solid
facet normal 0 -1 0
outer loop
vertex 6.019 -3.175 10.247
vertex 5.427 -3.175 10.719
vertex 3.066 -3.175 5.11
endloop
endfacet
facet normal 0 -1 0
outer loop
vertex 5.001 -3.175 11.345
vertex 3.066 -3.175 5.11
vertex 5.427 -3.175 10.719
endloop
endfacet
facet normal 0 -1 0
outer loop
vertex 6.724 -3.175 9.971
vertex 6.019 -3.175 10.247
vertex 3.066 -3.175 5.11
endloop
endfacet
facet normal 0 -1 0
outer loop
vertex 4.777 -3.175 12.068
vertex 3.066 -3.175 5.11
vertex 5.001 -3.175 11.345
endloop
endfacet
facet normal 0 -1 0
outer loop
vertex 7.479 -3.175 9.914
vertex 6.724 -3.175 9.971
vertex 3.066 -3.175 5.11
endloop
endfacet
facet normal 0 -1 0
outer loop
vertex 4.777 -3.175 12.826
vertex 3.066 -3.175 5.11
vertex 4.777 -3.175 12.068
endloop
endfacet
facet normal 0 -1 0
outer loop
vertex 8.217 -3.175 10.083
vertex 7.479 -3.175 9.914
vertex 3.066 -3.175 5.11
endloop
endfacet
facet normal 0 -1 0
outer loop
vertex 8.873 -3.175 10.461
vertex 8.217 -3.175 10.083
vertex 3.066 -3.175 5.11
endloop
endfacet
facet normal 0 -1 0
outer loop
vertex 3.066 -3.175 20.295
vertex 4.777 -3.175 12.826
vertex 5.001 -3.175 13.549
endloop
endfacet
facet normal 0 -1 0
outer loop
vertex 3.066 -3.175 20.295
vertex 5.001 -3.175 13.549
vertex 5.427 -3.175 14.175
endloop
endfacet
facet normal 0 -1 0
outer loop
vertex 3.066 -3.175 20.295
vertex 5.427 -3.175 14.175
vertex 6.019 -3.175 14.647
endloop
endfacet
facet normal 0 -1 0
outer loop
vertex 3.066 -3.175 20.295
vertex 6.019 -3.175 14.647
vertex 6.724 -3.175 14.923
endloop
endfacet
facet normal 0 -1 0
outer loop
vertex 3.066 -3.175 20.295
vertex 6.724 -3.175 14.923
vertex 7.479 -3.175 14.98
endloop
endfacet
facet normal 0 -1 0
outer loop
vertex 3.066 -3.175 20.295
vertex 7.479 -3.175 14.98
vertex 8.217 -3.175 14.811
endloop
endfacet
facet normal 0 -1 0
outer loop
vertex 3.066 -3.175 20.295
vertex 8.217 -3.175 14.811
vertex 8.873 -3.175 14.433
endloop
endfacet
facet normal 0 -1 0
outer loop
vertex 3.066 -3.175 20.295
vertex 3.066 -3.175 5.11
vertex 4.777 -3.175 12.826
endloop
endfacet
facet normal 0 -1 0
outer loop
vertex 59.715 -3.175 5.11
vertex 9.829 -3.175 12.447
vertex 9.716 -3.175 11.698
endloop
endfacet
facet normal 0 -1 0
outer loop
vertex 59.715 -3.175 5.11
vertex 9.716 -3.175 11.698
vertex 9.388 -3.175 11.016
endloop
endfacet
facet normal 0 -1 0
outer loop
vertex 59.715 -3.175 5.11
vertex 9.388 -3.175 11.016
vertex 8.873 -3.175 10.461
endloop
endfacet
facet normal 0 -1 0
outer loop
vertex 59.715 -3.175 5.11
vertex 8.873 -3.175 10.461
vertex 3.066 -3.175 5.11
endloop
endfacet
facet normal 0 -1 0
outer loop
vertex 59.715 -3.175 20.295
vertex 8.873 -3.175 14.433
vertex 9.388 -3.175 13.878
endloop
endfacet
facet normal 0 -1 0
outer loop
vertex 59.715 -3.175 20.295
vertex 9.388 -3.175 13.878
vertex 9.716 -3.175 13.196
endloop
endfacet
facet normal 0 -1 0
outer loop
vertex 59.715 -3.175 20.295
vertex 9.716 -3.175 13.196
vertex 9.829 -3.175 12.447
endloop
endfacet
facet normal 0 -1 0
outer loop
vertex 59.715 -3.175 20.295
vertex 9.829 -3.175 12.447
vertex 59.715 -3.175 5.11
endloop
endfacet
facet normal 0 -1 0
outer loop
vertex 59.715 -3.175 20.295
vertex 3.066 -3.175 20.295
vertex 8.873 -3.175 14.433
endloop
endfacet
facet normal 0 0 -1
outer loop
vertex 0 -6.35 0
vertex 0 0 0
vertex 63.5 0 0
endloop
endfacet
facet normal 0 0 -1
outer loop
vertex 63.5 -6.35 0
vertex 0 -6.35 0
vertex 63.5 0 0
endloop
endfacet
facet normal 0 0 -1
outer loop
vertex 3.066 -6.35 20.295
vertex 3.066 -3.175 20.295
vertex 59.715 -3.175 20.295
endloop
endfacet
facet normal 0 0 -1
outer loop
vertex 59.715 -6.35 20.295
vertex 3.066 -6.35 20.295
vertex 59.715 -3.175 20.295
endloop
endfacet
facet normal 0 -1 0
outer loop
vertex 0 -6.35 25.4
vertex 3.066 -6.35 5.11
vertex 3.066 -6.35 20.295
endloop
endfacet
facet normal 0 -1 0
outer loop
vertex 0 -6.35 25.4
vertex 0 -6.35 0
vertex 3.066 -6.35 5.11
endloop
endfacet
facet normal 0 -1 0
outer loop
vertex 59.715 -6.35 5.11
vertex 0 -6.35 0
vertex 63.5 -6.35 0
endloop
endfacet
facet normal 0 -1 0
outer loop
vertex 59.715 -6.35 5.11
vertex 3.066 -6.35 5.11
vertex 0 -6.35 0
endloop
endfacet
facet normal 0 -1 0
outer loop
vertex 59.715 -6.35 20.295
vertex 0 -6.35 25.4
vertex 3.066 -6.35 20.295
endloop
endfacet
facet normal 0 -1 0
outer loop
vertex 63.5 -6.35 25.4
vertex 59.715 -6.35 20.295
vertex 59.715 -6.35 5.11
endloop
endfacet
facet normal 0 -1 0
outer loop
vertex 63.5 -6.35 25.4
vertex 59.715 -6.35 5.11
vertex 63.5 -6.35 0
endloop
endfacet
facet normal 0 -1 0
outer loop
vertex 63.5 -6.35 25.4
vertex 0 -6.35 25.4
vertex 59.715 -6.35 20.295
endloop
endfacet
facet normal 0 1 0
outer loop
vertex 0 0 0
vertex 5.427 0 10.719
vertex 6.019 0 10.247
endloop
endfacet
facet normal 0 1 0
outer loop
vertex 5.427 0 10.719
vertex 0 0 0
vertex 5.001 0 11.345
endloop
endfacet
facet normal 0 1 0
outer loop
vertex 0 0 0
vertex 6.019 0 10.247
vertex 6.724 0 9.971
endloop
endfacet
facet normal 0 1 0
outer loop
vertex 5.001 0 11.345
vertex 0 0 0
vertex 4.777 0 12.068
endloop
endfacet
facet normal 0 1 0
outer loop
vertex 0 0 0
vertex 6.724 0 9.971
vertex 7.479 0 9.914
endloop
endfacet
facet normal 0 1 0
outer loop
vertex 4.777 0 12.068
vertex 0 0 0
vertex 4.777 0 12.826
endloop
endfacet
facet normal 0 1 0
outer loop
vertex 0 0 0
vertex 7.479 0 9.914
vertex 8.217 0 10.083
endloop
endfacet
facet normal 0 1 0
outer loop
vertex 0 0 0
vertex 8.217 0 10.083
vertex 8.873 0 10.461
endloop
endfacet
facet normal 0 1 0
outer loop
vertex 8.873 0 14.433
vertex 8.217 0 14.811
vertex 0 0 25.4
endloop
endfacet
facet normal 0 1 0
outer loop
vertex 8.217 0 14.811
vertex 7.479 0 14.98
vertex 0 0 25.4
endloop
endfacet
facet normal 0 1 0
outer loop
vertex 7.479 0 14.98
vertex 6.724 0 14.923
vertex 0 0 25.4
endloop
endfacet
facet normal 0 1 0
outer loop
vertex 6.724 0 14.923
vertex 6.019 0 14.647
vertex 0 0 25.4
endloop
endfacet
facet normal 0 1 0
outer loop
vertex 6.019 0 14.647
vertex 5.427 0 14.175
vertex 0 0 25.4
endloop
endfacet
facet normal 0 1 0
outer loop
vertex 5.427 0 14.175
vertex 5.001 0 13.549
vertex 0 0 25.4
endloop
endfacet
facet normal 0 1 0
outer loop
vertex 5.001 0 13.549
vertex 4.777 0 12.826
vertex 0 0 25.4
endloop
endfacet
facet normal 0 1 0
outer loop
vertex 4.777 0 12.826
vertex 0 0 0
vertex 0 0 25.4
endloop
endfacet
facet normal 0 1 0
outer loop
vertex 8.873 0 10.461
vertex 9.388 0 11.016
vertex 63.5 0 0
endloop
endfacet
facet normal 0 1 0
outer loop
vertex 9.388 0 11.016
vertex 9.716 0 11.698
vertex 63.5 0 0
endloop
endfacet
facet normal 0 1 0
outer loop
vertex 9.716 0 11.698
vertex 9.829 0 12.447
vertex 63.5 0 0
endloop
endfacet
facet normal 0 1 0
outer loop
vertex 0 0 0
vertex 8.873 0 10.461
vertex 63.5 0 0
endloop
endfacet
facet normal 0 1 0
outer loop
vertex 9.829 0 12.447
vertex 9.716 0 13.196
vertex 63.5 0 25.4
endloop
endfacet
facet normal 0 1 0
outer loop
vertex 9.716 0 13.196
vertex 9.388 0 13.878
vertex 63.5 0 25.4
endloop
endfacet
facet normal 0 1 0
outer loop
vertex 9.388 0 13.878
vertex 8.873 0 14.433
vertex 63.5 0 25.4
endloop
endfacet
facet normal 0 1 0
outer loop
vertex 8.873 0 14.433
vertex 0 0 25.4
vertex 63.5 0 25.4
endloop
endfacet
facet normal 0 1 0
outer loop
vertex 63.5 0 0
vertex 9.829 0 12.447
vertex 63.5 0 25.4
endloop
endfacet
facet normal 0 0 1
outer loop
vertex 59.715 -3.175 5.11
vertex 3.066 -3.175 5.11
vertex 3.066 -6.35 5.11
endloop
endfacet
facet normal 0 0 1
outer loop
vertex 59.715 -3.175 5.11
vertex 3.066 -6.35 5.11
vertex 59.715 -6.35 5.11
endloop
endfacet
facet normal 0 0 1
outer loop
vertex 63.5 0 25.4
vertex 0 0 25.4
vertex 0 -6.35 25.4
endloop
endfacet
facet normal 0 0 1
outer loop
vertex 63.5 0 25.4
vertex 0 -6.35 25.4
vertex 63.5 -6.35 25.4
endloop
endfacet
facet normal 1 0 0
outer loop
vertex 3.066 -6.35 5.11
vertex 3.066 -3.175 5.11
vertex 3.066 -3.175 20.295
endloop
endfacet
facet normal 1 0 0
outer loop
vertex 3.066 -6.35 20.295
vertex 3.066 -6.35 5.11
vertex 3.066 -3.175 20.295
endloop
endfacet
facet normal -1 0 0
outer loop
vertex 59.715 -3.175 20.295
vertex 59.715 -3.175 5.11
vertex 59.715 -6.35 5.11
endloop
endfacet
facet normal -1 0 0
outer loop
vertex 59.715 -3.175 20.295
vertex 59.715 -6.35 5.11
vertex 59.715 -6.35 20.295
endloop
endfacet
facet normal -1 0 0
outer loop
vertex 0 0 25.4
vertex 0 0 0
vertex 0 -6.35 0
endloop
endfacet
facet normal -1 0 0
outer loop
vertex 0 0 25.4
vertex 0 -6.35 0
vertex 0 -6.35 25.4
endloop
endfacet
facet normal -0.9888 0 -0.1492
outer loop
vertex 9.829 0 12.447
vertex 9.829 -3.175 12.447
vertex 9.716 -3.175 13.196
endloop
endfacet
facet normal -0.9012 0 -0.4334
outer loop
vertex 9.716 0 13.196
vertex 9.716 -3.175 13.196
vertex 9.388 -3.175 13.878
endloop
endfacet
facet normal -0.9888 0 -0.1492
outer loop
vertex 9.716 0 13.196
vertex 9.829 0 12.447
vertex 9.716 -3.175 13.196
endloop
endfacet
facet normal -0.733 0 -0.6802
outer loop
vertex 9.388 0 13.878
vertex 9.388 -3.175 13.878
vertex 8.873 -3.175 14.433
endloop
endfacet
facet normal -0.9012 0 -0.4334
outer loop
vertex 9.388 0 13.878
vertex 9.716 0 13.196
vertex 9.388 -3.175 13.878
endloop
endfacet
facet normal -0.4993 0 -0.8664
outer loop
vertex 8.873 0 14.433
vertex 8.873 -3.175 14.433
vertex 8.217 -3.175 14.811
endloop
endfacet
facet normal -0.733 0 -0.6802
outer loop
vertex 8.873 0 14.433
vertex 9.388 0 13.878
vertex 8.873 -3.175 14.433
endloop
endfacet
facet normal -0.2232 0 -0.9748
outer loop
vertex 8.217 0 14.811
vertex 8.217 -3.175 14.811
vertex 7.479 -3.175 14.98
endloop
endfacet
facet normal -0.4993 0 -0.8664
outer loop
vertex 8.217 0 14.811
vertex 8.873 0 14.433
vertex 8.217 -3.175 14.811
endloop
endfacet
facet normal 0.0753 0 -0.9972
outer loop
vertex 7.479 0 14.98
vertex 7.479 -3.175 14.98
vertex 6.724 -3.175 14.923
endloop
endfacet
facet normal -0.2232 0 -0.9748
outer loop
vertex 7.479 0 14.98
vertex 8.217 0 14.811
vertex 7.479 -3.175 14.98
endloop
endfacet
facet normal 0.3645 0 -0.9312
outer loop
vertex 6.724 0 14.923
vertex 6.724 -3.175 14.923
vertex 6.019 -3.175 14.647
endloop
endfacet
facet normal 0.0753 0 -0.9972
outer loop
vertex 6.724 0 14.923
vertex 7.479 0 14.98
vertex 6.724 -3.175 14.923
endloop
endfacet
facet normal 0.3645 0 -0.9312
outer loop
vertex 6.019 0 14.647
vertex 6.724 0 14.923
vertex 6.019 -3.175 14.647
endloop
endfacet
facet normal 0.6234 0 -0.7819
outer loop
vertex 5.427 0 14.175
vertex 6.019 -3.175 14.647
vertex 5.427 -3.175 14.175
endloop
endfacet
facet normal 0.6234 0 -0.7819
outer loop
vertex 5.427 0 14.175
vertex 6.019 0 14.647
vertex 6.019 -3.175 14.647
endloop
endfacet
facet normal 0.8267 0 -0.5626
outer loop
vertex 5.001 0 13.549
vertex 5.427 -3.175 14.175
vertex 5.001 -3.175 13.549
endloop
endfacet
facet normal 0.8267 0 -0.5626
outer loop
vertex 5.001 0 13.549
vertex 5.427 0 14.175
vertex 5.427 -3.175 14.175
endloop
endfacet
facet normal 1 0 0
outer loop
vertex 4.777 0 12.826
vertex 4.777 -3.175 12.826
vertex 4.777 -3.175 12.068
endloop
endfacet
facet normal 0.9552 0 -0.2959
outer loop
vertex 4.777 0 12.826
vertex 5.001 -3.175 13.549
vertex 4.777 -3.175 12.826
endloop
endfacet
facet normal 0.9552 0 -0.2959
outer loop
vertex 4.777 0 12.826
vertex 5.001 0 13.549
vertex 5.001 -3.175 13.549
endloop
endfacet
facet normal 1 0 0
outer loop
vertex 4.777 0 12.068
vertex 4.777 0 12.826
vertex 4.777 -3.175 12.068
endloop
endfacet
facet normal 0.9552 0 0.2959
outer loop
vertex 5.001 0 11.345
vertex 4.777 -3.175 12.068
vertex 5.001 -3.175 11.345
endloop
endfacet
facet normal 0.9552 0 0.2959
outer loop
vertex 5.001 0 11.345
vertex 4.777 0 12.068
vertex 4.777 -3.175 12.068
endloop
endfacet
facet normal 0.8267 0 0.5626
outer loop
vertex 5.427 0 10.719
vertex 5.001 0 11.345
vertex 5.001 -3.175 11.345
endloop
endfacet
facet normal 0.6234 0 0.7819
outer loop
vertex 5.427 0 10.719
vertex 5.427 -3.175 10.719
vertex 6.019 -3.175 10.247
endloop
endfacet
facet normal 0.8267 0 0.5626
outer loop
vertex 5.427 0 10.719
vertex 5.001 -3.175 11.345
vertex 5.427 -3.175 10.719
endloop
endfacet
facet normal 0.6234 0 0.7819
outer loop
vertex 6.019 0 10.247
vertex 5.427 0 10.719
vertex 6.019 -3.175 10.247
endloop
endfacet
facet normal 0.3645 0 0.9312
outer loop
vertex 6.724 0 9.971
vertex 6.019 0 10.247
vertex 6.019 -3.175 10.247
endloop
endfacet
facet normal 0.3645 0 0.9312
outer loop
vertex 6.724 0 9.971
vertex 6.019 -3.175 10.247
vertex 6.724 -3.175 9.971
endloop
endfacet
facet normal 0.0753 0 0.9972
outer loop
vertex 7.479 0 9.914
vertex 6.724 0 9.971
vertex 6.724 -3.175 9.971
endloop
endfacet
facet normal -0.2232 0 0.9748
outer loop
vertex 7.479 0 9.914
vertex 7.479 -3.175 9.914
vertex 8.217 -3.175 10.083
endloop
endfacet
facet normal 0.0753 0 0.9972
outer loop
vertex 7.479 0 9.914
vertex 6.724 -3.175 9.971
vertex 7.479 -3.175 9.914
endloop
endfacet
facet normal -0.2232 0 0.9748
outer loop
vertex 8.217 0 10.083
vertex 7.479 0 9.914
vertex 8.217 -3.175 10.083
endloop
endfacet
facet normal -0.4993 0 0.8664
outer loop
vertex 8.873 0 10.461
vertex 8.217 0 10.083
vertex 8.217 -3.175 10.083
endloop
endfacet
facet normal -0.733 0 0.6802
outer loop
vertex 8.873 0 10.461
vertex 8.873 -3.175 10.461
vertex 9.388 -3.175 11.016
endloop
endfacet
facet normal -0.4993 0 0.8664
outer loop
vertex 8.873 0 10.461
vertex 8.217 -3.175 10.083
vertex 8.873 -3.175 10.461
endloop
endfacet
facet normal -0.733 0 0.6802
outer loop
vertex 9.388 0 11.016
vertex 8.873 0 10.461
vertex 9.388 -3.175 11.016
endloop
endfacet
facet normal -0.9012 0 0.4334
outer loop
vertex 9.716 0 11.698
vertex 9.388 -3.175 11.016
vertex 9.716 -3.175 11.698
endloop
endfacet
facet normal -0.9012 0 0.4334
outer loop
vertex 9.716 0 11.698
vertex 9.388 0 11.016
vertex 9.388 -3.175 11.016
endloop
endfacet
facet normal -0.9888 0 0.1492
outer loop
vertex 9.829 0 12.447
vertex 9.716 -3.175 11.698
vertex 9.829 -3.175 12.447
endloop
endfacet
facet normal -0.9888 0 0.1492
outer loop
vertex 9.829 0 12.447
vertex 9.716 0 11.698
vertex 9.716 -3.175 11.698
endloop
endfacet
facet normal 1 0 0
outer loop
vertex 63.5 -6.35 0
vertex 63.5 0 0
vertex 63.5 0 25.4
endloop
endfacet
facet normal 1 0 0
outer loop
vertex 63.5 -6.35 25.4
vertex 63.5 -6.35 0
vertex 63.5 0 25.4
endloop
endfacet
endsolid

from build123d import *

# Parameters (mm, degrees)
F0_W     = 63.5
F0_H     = 25.4
F0_W_2   = 56.649408
F0_H_2   = 15.184378
F1_DEPTH = 6.35
F2_DEPTH = 3.175
F3_R     = 2.54
F4_DEPTH = 25.4


with BuildPart() as f1:
    # F0 (on Front) → F1 (new body)
    with BuildSketch(Plane.XZ):
        with Locations((31.75, 12.7)):
            Rectangle(F0_W, F0_H)
        with Locations((31.390783, 12.702317)):
            Rectangle(F0_W_2, F0_H_2, mode=Mode.SUBTRACT)
    extrude(amount=F1_DEPTH)

    # F0 (on Front) → F2 (join)
    with BuildSketch(Plane.XZ):
        with Locations((31.390783, 12.702317)):
            Rectangle(F0_W_2, F0_H_2)
    extrude(amount=F2_DEPTH)

    # F3 (on Front) → F4 (cut)
    with BuildSketch(Plane.XZ):
        with Locations((7.289108, 12.447039)):
            Circle(F3_R)
    extrude(amount=F4_DEPTH, mode=Mode.SUBTRACT)


solid = f1.part
